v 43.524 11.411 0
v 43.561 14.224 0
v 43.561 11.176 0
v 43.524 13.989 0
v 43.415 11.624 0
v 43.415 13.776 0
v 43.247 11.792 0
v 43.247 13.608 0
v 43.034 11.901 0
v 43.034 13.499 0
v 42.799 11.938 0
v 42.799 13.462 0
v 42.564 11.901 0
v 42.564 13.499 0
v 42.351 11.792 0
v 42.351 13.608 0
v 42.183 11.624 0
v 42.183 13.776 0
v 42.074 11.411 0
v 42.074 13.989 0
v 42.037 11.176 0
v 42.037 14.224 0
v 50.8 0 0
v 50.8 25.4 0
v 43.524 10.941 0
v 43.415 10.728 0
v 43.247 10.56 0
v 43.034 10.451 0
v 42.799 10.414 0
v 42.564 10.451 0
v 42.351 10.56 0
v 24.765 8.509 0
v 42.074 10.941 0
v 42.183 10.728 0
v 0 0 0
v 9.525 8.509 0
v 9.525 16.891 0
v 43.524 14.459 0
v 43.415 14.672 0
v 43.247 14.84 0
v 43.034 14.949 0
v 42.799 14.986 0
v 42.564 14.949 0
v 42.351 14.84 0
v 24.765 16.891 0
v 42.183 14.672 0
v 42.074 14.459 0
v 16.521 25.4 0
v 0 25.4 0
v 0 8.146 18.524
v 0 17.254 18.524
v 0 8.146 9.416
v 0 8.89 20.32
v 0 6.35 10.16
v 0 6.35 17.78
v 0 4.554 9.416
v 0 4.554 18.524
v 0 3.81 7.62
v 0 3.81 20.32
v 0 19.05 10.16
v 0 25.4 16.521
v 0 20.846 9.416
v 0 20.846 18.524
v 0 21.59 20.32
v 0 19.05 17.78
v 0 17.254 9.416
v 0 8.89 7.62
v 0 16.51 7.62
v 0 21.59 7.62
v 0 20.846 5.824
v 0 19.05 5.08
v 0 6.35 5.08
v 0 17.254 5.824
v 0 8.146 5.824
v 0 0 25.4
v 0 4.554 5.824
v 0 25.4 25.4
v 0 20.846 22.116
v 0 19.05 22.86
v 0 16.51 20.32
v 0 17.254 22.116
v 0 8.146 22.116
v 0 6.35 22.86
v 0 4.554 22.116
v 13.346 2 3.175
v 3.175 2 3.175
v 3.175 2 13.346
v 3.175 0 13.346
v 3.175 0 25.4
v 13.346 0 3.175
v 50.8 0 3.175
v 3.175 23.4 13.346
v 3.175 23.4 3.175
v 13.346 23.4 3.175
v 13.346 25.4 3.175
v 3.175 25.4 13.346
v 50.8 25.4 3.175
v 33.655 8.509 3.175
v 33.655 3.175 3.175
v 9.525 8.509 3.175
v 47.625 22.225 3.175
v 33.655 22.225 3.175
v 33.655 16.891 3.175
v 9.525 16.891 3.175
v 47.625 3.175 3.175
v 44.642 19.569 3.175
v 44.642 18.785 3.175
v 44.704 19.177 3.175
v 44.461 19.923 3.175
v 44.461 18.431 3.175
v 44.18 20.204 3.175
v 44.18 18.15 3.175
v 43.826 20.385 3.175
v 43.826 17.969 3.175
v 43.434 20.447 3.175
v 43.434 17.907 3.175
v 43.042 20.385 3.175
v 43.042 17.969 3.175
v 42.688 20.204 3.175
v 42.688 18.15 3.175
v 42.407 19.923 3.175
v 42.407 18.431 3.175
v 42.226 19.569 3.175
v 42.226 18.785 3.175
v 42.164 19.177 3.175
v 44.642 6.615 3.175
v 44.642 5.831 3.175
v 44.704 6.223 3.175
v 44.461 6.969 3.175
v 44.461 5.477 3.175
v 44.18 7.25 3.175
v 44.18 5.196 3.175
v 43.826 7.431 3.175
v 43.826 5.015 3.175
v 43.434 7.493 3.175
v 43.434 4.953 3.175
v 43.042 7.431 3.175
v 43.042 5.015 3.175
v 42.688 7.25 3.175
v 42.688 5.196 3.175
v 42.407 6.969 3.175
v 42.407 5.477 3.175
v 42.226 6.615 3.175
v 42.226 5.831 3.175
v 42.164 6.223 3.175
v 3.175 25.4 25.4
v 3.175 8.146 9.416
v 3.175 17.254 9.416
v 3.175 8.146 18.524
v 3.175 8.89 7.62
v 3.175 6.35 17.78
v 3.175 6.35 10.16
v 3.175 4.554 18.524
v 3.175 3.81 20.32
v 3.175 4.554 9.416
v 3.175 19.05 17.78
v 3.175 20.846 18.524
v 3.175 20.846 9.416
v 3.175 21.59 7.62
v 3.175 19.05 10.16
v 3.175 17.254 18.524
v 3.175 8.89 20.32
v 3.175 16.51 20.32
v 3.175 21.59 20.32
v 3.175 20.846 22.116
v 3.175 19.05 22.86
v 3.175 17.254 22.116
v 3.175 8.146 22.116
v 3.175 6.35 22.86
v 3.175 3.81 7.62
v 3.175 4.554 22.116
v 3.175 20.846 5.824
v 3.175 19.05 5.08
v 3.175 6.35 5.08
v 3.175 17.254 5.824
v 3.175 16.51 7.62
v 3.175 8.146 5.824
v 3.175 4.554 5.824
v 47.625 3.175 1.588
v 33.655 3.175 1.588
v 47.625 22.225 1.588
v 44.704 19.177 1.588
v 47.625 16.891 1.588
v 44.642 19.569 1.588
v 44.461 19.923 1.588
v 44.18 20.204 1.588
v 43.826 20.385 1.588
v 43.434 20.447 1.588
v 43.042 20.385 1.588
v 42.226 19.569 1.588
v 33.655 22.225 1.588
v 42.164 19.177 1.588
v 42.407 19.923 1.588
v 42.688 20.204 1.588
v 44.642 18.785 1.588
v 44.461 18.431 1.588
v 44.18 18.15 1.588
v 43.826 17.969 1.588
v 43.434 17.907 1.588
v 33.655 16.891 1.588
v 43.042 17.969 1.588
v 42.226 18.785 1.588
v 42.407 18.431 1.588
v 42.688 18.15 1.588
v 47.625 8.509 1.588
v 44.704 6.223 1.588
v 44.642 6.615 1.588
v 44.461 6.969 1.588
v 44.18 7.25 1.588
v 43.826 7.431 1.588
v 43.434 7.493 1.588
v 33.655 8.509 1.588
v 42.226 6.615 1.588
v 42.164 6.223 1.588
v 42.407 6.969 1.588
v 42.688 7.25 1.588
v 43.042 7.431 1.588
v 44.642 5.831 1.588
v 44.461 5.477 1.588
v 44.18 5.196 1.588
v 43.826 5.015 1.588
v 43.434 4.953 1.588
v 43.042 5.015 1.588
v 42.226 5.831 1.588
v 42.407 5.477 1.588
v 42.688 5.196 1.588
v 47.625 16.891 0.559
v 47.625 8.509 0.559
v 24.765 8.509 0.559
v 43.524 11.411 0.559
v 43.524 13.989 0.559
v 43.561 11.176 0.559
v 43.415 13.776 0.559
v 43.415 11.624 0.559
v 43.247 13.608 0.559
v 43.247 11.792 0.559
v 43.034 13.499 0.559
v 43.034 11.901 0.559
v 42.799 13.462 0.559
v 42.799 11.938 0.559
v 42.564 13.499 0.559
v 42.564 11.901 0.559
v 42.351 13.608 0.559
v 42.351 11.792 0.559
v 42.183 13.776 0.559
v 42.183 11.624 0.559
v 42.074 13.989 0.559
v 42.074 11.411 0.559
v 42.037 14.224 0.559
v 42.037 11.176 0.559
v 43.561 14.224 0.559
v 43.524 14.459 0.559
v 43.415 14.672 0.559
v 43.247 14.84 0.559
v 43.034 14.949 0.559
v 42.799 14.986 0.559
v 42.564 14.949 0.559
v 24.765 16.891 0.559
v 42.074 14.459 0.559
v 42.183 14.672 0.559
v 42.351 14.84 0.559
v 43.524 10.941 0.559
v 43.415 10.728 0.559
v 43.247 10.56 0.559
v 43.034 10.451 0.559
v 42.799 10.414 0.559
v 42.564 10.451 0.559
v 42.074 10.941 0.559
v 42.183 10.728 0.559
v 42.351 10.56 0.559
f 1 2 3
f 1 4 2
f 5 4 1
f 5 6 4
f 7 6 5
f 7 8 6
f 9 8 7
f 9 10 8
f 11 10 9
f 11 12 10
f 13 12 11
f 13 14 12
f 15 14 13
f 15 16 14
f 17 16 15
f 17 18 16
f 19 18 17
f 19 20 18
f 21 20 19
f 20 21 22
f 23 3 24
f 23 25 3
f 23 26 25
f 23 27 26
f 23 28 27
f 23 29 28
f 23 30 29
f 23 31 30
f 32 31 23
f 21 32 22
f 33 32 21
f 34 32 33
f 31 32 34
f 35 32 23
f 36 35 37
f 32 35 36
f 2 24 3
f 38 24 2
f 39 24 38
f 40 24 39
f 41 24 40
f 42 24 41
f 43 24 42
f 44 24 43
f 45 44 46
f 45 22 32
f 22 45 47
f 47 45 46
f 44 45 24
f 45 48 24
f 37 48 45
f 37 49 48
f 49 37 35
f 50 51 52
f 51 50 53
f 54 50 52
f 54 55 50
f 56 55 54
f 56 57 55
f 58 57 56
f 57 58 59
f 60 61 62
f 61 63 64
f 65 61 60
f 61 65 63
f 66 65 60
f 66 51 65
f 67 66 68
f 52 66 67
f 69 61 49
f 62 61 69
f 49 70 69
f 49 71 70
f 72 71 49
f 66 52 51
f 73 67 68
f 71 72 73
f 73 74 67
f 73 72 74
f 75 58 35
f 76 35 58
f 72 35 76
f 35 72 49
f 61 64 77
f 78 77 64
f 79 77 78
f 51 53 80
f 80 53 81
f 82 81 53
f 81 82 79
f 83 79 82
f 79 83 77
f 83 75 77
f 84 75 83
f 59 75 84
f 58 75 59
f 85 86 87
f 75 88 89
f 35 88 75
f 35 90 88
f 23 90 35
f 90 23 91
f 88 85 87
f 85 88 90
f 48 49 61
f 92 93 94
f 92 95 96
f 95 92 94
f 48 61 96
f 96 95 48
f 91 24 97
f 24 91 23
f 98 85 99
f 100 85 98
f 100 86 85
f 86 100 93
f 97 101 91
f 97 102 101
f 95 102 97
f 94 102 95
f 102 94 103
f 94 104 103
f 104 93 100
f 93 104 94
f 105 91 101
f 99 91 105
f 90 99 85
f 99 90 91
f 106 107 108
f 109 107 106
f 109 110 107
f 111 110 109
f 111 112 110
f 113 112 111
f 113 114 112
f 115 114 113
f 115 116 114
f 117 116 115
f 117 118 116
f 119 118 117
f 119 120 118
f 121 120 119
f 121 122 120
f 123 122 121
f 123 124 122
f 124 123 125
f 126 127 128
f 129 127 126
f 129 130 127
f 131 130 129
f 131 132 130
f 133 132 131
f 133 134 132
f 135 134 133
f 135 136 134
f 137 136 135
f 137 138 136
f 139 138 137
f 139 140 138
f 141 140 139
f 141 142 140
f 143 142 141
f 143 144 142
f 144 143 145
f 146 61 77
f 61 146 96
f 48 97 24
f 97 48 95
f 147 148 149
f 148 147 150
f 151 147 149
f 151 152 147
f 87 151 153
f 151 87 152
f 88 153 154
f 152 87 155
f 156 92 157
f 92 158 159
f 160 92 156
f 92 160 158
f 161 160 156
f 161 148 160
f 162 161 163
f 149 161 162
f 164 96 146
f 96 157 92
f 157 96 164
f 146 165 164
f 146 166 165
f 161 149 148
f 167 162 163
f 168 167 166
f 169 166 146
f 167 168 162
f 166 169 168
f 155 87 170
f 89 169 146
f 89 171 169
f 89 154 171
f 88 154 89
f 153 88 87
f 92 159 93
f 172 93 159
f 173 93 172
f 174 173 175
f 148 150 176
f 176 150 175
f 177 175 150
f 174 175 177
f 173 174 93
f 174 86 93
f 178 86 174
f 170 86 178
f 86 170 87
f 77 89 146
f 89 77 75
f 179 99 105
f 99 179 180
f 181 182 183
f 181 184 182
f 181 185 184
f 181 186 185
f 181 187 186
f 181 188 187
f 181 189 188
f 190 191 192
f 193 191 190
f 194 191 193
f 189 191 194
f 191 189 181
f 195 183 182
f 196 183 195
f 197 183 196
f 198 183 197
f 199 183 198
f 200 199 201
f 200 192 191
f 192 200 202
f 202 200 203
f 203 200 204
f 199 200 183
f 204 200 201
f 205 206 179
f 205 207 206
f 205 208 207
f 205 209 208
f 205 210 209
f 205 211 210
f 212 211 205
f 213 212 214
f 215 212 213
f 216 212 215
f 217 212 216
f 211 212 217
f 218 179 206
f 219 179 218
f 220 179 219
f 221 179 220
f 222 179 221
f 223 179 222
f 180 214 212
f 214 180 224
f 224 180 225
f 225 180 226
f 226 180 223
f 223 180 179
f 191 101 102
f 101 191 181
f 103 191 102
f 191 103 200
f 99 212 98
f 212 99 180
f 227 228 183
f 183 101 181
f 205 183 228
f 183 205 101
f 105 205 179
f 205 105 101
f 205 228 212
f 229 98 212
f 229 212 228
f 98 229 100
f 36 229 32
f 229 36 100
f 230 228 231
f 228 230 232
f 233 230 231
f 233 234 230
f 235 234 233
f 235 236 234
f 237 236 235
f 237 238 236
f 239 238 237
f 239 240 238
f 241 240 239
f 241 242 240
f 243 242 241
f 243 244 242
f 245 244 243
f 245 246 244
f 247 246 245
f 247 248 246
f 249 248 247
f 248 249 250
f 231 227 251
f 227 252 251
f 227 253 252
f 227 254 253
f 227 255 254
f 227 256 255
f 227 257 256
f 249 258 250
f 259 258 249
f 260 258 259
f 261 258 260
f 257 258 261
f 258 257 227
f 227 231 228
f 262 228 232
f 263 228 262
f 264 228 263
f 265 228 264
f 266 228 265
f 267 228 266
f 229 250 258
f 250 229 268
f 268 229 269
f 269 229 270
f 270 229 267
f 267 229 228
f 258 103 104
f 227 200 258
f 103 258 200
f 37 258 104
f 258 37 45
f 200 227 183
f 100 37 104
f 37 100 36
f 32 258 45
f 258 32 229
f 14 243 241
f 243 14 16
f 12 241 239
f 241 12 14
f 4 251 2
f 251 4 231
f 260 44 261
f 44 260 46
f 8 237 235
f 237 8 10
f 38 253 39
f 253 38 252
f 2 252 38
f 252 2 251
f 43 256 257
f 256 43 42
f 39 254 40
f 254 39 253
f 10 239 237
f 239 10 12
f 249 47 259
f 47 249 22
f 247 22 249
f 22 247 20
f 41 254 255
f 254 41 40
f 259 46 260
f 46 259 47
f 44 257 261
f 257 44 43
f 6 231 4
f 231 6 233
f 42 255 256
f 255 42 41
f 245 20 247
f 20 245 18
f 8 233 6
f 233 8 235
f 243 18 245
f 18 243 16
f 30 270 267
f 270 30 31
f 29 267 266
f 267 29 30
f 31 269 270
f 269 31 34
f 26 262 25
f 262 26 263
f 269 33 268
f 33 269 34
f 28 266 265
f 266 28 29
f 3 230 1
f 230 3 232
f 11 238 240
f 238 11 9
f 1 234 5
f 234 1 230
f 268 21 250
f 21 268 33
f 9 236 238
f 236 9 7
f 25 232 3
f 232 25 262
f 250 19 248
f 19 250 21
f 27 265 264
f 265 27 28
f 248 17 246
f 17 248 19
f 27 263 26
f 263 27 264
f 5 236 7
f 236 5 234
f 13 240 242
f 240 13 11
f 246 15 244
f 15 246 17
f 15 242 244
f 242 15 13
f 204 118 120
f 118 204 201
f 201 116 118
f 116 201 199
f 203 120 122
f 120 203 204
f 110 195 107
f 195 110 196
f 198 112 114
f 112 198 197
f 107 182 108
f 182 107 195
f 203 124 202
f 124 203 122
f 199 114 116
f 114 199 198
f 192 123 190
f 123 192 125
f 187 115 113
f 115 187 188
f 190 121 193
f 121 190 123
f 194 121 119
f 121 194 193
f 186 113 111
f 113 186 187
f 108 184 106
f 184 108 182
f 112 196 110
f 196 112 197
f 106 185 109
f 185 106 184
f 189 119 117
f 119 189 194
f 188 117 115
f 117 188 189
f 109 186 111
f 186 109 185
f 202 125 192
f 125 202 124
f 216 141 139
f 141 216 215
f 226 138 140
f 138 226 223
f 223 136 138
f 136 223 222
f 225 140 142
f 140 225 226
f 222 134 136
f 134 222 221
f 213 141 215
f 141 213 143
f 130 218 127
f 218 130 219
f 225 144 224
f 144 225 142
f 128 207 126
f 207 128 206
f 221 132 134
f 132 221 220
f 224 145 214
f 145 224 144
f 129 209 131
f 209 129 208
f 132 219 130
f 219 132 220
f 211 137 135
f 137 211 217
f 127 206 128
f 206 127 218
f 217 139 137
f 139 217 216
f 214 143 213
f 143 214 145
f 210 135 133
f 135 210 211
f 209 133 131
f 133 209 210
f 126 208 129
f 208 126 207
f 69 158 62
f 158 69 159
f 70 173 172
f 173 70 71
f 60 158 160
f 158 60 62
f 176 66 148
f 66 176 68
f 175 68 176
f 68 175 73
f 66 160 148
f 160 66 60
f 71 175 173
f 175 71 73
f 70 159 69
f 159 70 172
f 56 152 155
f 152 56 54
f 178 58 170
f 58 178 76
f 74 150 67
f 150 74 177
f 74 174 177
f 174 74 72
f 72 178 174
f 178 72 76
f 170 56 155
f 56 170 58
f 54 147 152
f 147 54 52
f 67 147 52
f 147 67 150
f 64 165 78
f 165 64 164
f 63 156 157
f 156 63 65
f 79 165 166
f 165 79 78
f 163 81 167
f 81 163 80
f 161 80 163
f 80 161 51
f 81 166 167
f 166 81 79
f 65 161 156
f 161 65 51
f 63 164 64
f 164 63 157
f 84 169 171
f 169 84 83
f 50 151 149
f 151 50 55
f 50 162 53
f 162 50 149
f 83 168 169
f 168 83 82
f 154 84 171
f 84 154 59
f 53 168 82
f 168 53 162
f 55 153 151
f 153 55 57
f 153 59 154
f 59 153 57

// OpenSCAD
width=inch(1);
thickness=inch(0.125);
length=inch(2);
diagthick=2;

holedia = inch(.2);


function inch(a)  =     a*25.4;

module mytriangle()
{
    intersection() {
	cube([width, diagthick, width]);
	translate([-width+6, 0, 0]) {
	    rotate([0, 45, 0]) {
		cube([width, diagthick, width]);
	    }
	}    
    }
}

module bracket() {
    union(){
	cube([inch(2),   inch(1), thickness  ]);   // bottom - where sensor goes
	cube([thickness, inch(1), inch(1) ]);	// vertical mounting tail
    
        mytriangle();
	translate([0, width-diagthick, 0]) {
	    mytriangle();
	}

    }
}

// positive model of wcp hall-effect sensor
module wcp971() {

    difference() {
	union(){
	    cube([inch(.750), inch(.550), inch(.0635)]);
	    translate([ inch((.750-.330)/2), 0, 0]) {
		cube([ inch(.330), inch(1.500), inch(.104)]);
	    }
	    translate([ inch((.750-.330)/2), inch(0.9), 0]) {
		cube([ inch(.330), inch(0.60), inch(.2)]);
	    }
	    
	    translate([inch((.750-.12)/2 ), inch(.190), -1]) {
		cylinder(h=8, d=inch(.06),  $fn=20);
	    }
	    translate([inch(.750-(.750-.12)/2 ), inch(.190), -1]) {
		cylinder(h=8, d=inch(.06),  $fn=20);
	    }
	    
	}

	translate([inch((.750-.510)/2 ), inch(.165), -1]) {
	    cylinder(h=8,d=inch(.100),  $fn=20);
	}

	translate([inch(.750 - (.750-.510)/2 ), inch(.165), -1]) {
	    cylinder(h=8,d=inch(.100),  $fn=20);
	}
    }
}

// put it all together
union(){
    difference () {
	bracket();

	translate([inch(1.875),inch(.875),inch(0.126)]) {
	    rotate([0,180,90]) {
		wcp971();
	    }
	}

	// bottom-side holes 
/*
	translate([15,20,0]) {
		cylinder(h=6,d=6);
	}
*/

// holes in vertical tail for mounting
	translate([-1, inch(0.75),inch(0.3) ]) {
	    rotate([0,90,0]) {
		cylinder(h=8,d=holedia);
	    }
        }
	translate([-1, inch(0.25), inch(0.3) ]) {
	    rotate([0,90,0]) {
		cylinder(h=8,d=holedia);
	    }
        }

	translate([-1, inch(0.75),inch(0.8) ]) {
	    rotate([0,90,0]) {
		cylinder(h=8,d=holedia);
	    }
        }
	translate([-1, inch(0.25), inch(0.8) ]) {
	    rotate([0,90,0]) {
		cylinder(h=8,d=holedia);
	    }
        }
    }
}
